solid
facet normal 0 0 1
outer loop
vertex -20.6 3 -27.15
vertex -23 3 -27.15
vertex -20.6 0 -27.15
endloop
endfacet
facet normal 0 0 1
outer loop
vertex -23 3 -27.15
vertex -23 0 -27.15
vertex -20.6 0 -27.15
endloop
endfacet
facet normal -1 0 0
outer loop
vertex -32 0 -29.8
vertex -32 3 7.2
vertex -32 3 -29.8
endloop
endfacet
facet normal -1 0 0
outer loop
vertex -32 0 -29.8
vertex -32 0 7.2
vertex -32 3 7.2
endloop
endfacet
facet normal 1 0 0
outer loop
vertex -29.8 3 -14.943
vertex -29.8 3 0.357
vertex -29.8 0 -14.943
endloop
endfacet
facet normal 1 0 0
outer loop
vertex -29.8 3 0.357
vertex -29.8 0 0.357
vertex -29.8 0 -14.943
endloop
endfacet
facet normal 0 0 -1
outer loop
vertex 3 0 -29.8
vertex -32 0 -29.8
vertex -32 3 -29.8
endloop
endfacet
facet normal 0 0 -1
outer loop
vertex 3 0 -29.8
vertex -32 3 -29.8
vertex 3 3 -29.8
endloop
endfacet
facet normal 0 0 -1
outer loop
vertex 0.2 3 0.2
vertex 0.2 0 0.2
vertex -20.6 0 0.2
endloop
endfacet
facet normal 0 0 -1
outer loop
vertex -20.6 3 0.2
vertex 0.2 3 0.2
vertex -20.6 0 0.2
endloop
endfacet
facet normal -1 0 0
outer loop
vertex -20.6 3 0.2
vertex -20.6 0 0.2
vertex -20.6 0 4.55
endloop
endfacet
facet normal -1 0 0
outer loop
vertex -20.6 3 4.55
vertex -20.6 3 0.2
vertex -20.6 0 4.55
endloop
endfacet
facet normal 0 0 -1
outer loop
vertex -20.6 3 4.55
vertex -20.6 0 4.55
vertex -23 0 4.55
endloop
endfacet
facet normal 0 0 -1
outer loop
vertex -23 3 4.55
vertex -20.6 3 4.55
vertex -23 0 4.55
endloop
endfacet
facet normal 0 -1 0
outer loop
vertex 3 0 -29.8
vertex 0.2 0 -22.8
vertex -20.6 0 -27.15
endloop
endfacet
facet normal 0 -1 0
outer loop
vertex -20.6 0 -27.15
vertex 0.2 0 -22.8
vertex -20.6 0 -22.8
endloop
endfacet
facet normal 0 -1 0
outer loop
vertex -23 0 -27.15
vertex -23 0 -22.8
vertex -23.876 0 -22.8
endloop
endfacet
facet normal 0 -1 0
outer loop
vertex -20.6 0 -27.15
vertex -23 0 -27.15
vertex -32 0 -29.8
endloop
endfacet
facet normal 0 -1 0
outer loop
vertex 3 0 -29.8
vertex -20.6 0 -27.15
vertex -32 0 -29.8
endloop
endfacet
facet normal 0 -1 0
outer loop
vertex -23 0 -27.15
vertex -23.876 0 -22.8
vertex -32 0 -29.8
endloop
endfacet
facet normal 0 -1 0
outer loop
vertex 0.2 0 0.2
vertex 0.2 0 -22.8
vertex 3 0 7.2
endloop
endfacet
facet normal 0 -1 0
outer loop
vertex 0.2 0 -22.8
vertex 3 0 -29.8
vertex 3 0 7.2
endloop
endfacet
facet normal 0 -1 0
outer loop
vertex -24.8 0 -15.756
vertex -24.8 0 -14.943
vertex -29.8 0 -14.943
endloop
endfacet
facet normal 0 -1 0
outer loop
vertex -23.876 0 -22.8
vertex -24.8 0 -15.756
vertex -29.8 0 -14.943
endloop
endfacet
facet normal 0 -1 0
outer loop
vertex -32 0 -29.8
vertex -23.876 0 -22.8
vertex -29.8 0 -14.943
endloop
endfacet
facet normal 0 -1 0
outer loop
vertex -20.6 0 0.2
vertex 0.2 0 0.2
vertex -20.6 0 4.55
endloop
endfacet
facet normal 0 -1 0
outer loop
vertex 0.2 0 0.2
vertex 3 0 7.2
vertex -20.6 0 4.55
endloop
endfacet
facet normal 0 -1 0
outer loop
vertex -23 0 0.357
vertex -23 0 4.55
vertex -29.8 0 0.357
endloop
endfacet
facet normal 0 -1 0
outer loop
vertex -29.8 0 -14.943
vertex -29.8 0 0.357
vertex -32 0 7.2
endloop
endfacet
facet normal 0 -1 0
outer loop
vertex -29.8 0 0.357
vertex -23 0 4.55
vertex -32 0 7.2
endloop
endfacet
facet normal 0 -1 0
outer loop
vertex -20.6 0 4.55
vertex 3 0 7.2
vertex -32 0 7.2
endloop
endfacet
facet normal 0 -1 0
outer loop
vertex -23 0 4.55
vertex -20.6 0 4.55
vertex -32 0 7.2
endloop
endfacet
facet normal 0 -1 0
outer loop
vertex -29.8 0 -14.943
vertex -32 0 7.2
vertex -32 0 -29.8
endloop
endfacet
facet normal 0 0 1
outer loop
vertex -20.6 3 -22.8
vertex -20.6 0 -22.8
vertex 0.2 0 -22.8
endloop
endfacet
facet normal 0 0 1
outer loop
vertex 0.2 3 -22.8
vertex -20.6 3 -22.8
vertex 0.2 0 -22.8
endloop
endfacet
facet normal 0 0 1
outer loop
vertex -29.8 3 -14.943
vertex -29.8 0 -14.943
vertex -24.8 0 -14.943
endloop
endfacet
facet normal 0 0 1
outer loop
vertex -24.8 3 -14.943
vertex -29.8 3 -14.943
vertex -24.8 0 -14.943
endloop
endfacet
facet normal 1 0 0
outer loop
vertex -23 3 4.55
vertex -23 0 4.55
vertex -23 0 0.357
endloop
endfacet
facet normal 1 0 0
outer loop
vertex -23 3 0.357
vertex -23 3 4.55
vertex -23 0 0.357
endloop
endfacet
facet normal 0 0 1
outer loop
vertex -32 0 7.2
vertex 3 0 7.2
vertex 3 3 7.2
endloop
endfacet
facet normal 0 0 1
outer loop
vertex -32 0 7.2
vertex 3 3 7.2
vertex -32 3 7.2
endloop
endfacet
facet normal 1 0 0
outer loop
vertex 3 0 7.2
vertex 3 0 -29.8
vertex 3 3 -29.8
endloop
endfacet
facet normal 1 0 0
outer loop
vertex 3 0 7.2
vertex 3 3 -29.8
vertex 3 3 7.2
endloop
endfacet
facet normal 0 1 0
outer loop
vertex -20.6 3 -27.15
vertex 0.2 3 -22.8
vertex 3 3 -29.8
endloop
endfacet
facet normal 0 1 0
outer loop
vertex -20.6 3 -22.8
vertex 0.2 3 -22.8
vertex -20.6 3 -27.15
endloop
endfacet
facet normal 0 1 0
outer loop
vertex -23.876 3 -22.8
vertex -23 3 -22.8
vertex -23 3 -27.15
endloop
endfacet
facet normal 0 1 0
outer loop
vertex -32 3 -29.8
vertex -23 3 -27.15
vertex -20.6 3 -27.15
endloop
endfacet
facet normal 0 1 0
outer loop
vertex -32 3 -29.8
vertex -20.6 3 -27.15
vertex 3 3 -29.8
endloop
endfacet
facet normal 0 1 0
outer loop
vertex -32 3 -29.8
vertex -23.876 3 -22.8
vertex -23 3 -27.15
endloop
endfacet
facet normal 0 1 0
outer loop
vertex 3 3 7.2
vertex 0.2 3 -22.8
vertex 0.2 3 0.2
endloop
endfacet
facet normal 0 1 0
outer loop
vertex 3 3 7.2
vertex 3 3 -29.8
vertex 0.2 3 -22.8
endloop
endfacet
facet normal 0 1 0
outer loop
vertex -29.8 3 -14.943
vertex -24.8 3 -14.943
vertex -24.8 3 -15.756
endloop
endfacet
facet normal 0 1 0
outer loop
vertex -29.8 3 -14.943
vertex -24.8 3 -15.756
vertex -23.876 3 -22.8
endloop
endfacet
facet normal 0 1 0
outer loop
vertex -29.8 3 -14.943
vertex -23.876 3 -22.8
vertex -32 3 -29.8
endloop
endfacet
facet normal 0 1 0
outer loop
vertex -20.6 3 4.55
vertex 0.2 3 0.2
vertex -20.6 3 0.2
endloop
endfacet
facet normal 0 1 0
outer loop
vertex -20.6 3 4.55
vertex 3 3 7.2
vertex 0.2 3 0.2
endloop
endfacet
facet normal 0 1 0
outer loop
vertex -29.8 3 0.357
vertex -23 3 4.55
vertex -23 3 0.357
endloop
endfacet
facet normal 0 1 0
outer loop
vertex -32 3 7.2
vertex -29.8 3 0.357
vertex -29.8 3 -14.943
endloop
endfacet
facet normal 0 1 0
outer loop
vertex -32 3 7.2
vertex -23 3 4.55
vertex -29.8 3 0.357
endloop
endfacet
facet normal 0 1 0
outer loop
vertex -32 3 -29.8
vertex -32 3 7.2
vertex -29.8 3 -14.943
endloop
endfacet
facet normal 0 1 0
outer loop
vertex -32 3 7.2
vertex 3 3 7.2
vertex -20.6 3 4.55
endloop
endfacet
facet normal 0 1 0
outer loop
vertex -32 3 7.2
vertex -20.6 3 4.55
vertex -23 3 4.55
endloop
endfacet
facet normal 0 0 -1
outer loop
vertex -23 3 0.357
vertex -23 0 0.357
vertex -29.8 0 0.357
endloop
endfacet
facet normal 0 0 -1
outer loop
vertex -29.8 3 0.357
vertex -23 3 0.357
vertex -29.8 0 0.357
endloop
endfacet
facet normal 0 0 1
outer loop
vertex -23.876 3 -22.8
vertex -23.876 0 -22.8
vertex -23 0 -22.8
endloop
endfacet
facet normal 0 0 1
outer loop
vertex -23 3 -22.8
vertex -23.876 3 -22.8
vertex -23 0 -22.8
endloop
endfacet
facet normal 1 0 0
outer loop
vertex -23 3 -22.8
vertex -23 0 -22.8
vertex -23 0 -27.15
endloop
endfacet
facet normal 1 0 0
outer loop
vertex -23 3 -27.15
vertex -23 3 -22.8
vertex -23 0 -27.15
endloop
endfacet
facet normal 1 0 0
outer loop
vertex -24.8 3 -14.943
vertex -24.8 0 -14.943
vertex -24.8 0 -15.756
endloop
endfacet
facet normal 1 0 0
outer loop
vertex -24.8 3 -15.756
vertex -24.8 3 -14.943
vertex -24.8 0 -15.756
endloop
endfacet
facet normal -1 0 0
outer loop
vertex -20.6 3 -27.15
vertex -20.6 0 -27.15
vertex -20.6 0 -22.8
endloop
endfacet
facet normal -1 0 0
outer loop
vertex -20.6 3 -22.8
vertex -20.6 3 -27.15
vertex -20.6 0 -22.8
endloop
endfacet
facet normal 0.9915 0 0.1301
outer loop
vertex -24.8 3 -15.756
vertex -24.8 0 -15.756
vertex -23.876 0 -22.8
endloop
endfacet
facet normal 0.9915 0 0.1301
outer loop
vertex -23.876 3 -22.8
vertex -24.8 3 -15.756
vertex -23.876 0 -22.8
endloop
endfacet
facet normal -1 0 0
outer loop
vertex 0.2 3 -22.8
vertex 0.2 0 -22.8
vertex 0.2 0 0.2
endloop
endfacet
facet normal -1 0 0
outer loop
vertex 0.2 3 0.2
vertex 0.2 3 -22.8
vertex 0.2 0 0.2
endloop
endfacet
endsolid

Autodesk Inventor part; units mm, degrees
ref_plane "YZ Plane" through (0, 0, 0) normal (1, 0, 0) x (0, 1, 0)
ref_plane "XZ Plane" through (0, 0, 0) normal (0, 1, 0) x (-1, 0, 0)
ref_plane "XY Plane" through (0, 0, 0) normal (0, 0, 1) x (1, 0, 0)
sketch "Sketch1" plane through (0, 0, 0) normal (0, 1, 0) x (-1, 0, 0)
  line L0 (0, 0) -> (20.8, 0)
  line L1 (20.8, 0) -> (20.8, -22.6) construction
  line L2 (20.8, -22.6) -> (0, -22.6)
  line L3 (0, -22.6) -> (0, 0)
  line L4 (22.8, 4.35) -> (20.8, 4.35)
  line L5 (20.8, -26.95) -> (22.8, -26.95)
  line L6 (24.6, 0.15) -> (24.6, -22.45) construction
  line L7 (29.6, -14.7432) -> (24.6, -14.7432)
  line L8 (24.6, -14.7432) -> (24.6, 0.15) construction
  line L9 (24.6, -14.7432) -> (22.8, -14.7432) construction
  line L10 (24.6, -15.7432) -> (22.8, -15.7432) construction
  line L11 (24.6, -15.7432) -> (23.7, -22.6)
  line L12 (0, 0) -> (0, 7.2) construction
  line L13 (0, 7.2) -> (-3, 7.2) construction
  line L14 (-3, 7.2) -> (32, 7.2)
  line L15 (32, 7.2) -> (32, -29.8)
  line L16 (32, -29.8) -> (-3, -29.8)
  line L17 (-3, -29.8) -> (-3, 7.2)
  line L18 (24.6, 0.15) -> (24.6, -15.7432) construction
  line L19 (22.8, -22.6) -> (23.7, -22.6)
  line L20 (22.8, 0.1568) -> (22.8, 4.35)
  line L21 (22.8, -26.95) -> (22.8, -22.6)
  line L22 (24.6, -14.7432) -> (24.6, -15.7432)
  line L23 (20.8, 4.35) -> (20.8, 0)
  line L24 (20.8, -22.6) -> (20.8, -26.95)
  line L25 (29.6, 0.1568) -> (29.6, -14.7432)
  line L26 (22.8, 0.1568) -> (29.6, 0.1568)
  line L27 (29.8, 0.3568) -> (29.8, -14.9432)
  line L28 (29.8, -14.9432) -> (24.8, -14.9432)
  line L29 (24.8, -14.9432) -> (24.8, -15.7563)
  line L30 (24.8, -15.7563) -> (23.8755, -22.8)
  line L31 (23.8755, -22.8) -> (23, -22.8)
  line L32 (23, -22.8) -> (23, -27.15)
  line L33 (23, -27.15) -> (20.6, -27.15)
  line L34 (20.6, -27.15) -> (20.6, -22.8)
  line L35 (20.6, -22.8) -> (-0.2, -22.8)
  line L36 (-0.2, -22.8) -> (-0.2, 0.2)
  line L37 (-0.2, 0.2) -> (20.6, 0.2)
  line L38 (20.6, 0.2) -> (20.6, 4.55)
  line L39 (20.6, 4.55) -> (23, 4.55)
  line L40 (23, 4.55) -> (23, 0.3568)
  line L41 (23, 0.3568) -> (29.8, 0.3568)
  point P0 (20.8, -11.3)
  dimension "d0" = 20.8
  dimension "d1" = 22.6
  dimension "d2" = 2
  dimension "d5" = 22.6
  dimension "d8" = 1
  dimension "d9" = 7.2
  dimension "d10" = 3
  dimension "d11" = 35
  dimension "d12" = 37
  dimension "d16" = 2
  dimension "d19" = 4.35
  dimension "d26" = 6.8
  dimension "d27" = 0.9
  dimension "d28" = 14.9
  dimension "d29" = 5
  dimension "d32" = 0.2
  dimension "d35" = 4.35
extrude "Extrusion5" add sketch "Sketch1" along normal blind 3 contours L14 L15 L16 L17
properties part number "flipper_robot_v2_servo_side_profile"
